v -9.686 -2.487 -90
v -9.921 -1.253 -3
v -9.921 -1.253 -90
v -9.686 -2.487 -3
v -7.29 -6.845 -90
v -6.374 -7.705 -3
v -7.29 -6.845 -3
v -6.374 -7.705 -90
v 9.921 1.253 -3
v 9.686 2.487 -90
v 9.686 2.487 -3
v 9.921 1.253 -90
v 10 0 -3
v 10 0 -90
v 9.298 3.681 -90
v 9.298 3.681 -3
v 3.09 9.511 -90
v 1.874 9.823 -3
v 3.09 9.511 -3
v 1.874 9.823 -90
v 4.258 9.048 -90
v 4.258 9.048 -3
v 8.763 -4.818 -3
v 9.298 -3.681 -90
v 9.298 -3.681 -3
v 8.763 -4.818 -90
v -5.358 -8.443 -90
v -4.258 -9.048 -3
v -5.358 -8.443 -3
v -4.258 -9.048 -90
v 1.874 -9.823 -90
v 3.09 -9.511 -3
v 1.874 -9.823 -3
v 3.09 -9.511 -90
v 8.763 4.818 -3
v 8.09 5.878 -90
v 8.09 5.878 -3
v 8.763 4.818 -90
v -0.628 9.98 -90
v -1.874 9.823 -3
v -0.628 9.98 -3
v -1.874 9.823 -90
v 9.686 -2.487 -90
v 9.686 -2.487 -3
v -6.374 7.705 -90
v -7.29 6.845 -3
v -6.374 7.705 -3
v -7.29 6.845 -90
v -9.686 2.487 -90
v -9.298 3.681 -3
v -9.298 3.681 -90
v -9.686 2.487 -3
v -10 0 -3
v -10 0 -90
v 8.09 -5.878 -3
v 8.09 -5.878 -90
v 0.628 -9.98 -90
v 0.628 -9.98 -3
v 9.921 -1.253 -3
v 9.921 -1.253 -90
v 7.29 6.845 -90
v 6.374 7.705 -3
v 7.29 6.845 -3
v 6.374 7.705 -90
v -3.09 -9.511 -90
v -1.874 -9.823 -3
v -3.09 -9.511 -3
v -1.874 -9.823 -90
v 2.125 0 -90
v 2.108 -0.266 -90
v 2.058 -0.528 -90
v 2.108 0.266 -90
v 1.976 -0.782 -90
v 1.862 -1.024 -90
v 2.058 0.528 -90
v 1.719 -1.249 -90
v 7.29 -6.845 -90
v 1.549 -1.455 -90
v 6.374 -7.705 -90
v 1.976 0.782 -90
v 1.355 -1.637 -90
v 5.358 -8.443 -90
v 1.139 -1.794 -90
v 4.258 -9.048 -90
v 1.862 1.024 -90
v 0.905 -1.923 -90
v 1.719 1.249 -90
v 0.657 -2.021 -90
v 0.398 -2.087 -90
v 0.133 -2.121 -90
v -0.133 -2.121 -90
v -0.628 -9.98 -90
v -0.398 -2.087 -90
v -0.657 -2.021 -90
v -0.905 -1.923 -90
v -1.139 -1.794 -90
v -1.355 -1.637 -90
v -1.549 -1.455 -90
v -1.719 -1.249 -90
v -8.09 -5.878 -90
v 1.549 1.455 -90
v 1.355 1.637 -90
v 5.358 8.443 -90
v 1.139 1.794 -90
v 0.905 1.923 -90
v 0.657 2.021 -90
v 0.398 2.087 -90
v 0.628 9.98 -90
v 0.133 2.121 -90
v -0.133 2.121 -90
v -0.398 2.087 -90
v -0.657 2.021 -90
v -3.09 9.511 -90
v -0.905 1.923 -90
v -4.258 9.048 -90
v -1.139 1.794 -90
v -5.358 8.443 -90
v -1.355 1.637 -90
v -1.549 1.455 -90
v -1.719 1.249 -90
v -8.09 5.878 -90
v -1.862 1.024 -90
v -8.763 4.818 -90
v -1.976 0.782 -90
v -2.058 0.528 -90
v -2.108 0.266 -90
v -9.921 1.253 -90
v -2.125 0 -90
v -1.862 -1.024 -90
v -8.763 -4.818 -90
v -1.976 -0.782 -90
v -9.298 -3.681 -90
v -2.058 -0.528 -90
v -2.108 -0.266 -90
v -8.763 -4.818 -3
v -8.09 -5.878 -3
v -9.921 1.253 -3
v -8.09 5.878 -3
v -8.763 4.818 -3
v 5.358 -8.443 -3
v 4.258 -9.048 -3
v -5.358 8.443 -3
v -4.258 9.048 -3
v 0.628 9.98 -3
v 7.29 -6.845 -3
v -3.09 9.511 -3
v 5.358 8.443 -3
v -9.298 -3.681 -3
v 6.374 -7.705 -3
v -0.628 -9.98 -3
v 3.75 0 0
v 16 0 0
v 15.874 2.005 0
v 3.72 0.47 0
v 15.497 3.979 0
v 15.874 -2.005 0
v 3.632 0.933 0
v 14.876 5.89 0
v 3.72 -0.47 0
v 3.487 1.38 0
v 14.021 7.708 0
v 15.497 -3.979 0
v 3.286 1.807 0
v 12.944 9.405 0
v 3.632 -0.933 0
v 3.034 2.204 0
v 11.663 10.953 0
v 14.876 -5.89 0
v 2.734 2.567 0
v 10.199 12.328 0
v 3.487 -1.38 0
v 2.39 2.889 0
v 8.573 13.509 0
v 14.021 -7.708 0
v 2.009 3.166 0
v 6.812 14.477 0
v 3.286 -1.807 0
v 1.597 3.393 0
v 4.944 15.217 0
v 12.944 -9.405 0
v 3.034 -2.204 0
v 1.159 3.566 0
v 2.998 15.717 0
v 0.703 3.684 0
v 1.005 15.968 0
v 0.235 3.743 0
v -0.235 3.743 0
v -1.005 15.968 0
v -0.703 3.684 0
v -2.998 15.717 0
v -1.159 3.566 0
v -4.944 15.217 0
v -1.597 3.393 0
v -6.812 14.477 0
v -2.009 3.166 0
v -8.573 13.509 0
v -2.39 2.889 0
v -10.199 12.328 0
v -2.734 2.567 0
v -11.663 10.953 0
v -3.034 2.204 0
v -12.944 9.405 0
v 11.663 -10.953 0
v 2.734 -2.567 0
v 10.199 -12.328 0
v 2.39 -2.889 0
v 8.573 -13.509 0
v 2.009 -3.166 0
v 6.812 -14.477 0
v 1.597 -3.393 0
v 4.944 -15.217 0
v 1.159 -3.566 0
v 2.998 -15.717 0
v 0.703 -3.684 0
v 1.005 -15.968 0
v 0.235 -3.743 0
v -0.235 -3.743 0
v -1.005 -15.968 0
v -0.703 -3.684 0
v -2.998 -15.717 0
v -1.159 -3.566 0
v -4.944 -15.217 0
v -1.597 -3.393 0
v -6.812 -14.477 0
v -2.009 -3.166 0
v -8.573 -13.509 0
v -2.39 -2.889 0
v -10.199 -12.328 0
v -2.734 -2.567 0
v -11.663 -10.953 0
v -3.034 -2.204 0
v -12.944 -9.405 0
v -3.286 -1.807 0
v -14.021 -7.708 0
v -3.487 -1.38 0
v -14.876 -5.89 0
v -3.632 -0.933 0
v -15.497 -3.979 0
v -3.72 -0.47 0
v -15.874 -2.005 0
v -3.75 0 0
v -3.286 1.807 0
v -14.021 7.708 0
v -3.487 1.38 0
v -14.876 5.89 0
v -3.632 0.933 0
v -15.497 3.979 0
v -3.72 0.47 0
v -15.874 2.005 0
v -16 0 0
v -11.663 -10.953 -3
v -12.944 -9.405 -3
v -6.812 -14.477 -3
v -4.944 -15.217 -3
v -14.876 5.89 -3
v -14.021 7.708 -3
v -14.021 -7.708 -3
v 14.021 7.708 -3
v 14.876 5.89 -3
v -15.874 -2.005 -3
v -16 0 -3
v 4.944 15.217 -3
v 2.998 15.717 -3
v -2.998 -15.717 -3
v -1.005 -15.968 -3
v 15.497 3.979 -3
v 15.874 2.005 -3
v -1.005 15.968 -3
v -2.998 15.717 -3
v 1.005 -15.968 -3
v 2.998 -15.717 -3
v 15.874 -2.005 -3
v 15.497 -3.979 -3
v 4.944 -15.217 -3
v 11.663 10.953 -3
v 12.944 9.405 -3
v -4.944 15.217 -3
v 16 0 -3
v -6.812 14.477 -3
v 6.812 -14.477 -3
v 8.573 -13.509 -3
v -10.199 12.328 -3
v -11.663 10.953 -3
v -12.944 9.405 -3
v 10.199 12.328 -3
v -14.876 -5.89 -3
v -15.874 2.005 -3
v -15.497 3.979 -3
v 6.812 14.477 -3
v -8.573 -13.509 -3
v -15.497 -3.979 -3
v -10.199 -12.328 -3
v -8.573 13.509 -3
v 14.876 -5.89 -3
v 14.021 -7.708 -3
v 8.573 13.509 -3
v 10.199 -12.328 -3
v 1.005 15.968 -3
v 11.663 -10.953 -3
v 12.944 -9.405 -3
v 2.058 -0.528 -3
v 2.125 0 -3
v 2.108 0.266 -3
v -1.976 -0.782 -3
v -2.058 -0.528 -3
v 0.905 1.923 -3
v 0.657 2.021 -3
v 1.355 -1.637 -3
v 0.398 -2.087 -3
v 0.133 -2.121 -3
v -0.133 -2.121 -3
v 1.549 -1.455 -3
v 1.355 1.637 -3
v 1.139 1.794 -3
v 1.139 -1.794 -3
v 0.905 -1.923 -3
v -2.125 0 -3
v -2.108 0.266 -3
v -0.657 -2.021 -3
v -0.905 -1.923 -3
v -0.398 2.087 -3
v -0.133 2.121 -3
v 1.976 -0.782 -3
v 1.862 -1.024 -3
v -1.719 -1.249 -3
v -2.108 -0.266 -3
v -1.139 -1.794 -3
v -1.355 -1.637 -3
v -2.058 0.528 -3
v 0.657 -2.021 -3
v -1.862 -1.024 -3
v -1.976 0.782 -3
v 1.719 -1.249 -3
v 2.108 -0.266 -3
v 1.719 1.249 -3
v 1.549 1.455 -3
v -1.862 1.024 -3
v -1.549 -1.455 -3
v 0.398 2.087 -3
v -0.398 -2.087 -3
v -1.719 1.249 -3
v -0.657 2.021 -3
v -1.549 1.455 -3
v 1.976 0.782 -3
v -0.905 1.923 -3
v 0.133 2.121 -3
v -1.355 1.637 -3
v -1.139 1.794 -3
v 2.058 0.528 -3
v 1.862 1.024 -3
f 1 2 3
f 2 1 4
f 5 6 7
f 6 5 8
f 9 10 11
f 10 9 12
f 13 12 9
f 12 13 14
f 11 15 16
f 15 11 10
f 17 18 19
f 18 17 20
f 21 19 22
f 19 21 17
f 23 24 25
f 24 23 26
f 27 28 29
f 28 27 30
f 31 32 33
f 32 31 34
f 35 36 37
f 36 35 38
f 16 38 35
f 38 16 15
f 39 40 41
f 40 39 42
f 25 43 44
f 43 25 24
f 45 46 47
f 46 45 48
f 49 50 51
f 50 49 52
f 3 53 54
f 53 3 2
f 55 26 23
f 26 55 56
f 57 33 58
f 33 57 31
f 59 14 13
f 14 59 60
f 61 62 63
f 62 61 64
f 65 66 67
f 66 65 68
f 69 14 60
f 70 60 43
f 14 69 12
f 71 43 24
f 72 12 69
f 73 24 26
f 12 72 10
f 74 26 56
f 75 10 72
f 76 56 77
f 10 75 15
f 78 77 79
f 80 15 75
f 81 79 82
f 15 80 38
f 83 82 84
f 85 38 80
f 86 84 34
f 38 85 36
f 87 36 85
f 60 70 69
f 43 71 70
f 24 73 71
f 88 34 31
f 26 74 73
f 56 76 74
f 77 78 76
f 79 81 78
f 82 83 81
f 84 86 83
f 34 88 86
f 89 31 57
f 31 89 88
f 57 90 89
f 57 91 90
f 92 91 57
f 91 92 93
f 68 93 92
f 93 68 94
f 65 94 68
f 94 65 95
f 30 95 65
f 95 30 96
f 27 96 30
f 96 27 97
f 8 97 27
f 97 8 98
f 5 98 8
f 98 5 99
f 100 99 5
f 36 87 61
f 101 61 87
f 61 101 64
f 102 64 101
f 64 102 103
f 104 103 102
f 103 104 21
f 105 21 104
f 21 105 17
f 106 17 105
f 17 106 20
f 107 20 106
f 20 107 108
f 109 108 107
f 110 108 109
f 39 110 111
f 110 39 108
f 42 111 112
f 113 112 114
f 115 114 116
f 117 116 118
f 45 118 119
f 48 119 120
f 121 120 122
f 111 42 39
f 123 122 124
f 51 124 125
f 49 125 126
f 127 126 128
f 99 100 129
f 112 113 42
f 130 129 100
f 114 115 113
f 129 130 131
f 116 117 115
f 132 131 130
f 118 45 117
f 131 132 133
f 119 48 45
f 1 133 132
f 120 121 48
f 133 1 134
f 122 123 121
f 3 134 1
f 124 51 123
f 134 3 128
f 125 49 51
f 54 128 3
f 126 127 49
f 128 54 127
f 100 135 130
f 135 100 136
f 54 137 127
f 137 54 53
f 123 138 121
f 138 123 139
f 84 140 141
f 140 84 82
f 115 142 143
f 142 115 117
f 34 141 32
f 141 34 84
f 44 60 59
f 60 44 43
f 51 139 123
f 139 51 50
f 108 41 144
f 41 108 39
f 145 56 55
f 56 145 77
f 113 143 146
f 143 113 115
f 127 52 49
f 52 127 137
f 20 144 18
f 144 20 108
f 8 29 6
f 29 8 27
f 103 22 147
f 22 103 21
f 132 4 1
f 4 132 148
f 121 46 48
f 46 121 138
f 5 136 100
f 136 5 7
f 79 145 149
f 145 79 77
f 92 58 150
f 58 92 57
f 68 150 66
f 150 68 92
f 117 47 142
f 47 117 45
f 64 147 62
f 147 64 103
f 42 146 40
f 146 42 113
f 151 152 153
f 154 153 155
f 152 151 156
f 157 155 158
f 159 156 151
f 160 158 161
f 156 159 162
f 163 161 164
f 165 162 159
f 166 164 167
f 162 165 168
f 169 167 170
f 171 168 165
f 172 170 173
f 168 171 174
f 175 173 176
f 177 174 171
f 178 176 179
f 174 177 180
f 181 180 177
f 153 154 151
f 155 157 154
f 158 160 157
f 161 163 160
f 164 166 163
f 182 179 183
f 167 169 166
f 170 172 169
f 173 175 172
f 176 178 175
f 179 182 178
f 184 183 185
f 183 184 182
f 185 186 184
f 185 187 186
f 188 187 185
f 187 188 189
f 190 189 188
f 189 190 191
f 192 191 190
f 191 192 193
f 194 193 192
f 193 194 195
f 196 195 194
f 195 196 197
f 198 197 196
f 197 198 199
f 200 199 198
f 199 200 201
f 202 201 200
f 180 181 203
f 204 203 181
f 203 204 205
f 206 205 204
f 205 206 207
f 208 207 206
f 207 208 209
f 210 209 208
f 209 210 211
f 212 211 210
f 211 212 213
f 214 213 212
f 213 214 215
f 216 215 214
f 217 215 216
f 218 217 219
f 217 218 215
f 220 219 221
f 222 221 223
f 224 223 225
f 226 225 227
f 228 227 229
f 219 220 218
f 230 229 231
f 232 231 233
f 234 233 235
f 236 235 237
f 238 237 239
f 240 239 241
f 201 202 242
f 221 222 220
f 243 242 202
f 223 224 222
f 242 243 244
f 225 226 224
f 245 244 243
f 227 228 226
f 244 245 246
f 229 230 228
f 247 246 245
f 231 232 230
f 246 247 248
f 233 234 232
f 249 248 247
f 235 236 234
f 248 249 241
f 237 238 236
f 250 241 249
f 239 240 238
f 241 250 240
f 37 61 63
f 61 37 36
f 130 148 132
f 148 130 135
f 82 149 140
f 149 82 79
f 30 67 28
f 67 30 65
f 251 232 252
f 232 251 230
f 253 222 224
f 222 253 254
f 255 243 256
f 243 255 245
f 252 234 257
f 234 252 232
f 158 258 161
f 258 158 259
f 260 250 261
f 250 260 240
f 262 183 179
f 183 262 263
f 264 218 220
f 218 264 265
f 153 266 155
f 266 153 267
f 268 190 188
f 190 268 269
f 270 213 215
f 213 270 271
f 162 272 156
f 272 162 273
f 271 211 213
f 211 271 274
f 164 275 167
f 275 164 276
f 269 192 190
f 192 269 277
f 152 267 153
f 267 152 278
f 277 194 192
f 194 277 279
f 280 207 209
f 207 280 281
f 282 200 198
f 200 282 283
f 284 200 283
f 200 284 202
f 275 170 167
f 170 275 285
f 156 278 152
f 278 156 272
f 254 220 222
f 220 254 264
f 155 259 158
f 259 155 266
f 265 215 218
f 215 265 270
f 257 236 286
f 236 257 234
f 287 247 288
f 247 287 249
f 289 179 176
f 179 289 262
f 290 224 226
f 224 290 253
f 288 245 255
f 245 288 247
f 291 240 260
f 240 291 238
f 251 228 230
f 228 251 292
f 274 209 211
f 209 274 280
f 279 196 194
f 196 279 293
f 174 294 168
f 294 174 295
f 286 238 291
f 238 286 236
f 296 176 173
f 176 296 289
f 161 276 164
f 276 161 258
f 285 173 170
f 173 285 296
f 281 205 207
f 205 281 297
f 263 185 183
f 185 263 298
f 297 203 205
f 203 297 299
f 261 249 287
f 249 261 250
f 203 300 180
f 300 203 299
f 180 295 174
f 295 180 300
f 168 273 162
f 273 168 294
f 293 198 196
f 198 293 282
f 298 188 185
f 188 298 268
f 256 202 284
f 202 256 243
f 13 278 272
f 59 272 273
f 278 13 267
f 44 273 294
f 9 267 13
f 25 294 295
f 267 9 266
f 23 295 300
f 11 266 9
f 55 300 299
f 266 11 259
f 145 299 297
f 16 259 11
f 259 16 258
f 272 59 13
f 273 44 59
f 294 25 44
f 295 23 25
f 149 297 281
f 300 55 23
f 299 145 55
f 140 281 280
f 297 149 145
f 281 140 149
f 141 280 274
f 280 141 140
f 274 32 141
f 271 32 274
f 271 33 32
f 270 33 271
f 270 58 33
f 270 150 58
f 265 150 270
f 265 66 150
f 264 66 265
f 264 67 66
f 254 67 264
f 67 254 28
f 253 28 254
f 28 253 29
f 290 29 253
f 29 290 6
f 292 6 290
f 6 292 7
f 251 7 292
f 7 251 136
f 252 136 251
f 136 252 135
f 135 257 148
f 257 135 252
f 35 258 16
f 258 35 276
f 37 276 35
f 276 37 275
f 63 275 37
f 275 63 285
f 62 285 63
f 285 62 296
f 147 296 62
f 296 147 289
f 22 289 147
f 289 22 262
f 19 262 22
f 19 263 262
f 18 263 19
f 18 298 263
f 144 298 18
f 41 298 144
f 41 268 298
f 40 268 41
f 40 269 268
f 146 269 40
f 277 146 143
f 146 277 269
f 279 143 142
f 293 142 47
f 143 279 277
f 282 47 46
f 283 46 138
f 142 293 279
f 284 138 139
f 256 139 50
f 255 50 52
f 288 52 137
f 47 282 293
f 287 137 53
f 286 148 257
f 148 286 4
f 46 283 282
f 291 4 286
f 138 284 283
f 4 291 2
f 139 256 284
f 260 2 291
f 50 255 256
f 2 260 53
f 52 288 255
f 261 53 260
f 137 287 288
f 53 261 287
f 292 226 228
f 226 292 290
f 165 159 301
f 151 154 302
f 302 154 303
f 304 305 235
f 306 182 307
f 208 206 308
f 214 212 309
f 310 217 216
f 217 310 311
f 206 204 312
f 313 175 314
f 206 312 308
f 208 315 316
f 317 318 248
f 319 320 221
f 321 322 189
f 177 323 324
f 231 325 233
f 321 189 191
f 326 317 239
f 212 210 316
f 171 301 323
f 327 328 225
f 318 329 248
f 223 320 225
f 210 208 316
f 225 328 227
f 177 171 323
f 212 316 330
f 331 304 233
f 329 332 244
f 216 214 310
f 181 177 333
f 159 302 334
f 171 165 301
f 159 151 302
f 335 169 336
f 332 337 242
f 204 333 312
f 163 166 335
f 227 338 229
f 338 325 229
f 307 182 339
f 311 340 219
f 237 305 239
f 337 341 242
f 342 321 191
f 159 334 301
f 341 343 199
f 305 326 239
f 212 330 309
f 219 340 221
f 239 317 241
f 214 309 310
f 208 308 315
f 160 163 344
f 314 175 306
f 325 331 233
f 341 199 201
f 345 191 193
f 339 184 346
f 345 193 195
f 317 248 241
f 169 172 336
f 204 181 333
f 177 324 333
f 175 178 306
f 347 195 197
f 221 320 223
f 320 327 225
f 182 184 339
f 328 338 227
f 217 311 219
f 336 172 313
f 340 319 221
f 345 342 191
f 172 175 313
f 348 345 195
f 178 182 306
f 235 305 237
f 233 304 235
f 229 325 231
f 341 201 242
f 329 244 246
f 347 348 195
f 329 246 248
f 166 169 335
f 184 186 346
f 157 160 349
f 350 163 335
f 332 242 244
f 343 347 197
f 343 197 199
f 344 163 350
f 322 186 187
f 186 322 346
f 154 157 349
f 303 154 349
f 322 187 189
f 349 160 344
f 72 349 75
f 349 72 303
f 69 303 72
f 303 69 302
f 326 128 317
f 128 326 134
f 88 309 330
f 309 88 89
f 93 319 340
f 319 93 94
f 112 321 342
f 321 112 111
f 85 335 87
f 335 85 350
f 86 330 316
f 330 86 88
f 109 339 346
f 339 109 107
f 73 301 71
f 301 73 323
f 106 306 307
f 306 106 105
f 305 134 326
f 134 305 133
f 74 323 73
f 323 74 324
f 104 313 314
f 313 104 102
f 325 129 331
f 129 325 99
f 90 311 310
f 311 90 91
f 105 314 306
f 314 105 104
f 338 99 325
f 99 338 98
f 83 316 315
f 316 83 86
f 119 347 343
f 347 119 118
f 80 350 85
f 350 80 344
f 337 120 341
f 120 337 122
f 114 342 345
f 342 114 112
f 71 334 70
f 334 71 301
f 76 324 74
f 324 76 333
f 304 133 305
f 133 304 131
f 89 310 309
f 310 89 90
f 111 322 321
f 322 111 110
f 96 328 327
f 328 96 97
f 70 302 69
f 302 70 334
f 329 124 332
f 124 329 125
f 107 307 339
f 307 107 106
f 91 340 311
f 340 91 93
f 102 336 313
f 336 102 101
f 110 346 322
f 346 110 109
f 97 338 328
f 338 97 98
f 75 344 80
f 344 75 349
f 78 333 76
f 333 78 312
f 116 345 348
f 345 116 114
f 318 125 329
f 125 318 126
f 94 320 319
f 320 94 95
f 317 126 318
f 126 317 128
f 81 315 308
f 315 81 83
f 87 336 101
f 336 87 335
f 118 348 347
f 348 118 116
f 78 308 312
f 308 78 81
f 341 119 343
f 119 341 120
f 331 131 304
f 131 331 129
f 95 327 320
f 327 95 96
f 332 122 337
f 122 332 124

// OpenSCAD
$fn = 50;


difference() {
	union() {
		translate(v = [0, 0, -90.0000000000]) {
			cylinder(h = 90, r = 10.0000000000);
		}
		translate(v = [0, 0, -3.0000000000]) {
			cylinder(h = 3, r = 16.0000000000);
		}
	}
	union() {
		translate(v = [0, 0, 0]) {
			rotate(a = [0, 0, 0]) {
				difference() {
					union() {
						#translate(v = [0, 0, -90.0000000000]) {
							cylinder(h = 90, r = 2.0000000000);
						}
						#translate(v = [0, 0, -3]) {
							cylinder(h = 3, r = 10.0000000000, r1 = 2.1250000000, r2 = 3.7500000000);
						}
						#translate(v = [0, 0, -90.0000000000]) {
							cylinder(h = 90, r = 2.1250000000);
						}
						#translate(v = [0, 0, -90.0000000000]) {
							cylinder(h = 90, r = 2.0000000000);
						}
					}
					union();
				}
			}
		}
	}
}
